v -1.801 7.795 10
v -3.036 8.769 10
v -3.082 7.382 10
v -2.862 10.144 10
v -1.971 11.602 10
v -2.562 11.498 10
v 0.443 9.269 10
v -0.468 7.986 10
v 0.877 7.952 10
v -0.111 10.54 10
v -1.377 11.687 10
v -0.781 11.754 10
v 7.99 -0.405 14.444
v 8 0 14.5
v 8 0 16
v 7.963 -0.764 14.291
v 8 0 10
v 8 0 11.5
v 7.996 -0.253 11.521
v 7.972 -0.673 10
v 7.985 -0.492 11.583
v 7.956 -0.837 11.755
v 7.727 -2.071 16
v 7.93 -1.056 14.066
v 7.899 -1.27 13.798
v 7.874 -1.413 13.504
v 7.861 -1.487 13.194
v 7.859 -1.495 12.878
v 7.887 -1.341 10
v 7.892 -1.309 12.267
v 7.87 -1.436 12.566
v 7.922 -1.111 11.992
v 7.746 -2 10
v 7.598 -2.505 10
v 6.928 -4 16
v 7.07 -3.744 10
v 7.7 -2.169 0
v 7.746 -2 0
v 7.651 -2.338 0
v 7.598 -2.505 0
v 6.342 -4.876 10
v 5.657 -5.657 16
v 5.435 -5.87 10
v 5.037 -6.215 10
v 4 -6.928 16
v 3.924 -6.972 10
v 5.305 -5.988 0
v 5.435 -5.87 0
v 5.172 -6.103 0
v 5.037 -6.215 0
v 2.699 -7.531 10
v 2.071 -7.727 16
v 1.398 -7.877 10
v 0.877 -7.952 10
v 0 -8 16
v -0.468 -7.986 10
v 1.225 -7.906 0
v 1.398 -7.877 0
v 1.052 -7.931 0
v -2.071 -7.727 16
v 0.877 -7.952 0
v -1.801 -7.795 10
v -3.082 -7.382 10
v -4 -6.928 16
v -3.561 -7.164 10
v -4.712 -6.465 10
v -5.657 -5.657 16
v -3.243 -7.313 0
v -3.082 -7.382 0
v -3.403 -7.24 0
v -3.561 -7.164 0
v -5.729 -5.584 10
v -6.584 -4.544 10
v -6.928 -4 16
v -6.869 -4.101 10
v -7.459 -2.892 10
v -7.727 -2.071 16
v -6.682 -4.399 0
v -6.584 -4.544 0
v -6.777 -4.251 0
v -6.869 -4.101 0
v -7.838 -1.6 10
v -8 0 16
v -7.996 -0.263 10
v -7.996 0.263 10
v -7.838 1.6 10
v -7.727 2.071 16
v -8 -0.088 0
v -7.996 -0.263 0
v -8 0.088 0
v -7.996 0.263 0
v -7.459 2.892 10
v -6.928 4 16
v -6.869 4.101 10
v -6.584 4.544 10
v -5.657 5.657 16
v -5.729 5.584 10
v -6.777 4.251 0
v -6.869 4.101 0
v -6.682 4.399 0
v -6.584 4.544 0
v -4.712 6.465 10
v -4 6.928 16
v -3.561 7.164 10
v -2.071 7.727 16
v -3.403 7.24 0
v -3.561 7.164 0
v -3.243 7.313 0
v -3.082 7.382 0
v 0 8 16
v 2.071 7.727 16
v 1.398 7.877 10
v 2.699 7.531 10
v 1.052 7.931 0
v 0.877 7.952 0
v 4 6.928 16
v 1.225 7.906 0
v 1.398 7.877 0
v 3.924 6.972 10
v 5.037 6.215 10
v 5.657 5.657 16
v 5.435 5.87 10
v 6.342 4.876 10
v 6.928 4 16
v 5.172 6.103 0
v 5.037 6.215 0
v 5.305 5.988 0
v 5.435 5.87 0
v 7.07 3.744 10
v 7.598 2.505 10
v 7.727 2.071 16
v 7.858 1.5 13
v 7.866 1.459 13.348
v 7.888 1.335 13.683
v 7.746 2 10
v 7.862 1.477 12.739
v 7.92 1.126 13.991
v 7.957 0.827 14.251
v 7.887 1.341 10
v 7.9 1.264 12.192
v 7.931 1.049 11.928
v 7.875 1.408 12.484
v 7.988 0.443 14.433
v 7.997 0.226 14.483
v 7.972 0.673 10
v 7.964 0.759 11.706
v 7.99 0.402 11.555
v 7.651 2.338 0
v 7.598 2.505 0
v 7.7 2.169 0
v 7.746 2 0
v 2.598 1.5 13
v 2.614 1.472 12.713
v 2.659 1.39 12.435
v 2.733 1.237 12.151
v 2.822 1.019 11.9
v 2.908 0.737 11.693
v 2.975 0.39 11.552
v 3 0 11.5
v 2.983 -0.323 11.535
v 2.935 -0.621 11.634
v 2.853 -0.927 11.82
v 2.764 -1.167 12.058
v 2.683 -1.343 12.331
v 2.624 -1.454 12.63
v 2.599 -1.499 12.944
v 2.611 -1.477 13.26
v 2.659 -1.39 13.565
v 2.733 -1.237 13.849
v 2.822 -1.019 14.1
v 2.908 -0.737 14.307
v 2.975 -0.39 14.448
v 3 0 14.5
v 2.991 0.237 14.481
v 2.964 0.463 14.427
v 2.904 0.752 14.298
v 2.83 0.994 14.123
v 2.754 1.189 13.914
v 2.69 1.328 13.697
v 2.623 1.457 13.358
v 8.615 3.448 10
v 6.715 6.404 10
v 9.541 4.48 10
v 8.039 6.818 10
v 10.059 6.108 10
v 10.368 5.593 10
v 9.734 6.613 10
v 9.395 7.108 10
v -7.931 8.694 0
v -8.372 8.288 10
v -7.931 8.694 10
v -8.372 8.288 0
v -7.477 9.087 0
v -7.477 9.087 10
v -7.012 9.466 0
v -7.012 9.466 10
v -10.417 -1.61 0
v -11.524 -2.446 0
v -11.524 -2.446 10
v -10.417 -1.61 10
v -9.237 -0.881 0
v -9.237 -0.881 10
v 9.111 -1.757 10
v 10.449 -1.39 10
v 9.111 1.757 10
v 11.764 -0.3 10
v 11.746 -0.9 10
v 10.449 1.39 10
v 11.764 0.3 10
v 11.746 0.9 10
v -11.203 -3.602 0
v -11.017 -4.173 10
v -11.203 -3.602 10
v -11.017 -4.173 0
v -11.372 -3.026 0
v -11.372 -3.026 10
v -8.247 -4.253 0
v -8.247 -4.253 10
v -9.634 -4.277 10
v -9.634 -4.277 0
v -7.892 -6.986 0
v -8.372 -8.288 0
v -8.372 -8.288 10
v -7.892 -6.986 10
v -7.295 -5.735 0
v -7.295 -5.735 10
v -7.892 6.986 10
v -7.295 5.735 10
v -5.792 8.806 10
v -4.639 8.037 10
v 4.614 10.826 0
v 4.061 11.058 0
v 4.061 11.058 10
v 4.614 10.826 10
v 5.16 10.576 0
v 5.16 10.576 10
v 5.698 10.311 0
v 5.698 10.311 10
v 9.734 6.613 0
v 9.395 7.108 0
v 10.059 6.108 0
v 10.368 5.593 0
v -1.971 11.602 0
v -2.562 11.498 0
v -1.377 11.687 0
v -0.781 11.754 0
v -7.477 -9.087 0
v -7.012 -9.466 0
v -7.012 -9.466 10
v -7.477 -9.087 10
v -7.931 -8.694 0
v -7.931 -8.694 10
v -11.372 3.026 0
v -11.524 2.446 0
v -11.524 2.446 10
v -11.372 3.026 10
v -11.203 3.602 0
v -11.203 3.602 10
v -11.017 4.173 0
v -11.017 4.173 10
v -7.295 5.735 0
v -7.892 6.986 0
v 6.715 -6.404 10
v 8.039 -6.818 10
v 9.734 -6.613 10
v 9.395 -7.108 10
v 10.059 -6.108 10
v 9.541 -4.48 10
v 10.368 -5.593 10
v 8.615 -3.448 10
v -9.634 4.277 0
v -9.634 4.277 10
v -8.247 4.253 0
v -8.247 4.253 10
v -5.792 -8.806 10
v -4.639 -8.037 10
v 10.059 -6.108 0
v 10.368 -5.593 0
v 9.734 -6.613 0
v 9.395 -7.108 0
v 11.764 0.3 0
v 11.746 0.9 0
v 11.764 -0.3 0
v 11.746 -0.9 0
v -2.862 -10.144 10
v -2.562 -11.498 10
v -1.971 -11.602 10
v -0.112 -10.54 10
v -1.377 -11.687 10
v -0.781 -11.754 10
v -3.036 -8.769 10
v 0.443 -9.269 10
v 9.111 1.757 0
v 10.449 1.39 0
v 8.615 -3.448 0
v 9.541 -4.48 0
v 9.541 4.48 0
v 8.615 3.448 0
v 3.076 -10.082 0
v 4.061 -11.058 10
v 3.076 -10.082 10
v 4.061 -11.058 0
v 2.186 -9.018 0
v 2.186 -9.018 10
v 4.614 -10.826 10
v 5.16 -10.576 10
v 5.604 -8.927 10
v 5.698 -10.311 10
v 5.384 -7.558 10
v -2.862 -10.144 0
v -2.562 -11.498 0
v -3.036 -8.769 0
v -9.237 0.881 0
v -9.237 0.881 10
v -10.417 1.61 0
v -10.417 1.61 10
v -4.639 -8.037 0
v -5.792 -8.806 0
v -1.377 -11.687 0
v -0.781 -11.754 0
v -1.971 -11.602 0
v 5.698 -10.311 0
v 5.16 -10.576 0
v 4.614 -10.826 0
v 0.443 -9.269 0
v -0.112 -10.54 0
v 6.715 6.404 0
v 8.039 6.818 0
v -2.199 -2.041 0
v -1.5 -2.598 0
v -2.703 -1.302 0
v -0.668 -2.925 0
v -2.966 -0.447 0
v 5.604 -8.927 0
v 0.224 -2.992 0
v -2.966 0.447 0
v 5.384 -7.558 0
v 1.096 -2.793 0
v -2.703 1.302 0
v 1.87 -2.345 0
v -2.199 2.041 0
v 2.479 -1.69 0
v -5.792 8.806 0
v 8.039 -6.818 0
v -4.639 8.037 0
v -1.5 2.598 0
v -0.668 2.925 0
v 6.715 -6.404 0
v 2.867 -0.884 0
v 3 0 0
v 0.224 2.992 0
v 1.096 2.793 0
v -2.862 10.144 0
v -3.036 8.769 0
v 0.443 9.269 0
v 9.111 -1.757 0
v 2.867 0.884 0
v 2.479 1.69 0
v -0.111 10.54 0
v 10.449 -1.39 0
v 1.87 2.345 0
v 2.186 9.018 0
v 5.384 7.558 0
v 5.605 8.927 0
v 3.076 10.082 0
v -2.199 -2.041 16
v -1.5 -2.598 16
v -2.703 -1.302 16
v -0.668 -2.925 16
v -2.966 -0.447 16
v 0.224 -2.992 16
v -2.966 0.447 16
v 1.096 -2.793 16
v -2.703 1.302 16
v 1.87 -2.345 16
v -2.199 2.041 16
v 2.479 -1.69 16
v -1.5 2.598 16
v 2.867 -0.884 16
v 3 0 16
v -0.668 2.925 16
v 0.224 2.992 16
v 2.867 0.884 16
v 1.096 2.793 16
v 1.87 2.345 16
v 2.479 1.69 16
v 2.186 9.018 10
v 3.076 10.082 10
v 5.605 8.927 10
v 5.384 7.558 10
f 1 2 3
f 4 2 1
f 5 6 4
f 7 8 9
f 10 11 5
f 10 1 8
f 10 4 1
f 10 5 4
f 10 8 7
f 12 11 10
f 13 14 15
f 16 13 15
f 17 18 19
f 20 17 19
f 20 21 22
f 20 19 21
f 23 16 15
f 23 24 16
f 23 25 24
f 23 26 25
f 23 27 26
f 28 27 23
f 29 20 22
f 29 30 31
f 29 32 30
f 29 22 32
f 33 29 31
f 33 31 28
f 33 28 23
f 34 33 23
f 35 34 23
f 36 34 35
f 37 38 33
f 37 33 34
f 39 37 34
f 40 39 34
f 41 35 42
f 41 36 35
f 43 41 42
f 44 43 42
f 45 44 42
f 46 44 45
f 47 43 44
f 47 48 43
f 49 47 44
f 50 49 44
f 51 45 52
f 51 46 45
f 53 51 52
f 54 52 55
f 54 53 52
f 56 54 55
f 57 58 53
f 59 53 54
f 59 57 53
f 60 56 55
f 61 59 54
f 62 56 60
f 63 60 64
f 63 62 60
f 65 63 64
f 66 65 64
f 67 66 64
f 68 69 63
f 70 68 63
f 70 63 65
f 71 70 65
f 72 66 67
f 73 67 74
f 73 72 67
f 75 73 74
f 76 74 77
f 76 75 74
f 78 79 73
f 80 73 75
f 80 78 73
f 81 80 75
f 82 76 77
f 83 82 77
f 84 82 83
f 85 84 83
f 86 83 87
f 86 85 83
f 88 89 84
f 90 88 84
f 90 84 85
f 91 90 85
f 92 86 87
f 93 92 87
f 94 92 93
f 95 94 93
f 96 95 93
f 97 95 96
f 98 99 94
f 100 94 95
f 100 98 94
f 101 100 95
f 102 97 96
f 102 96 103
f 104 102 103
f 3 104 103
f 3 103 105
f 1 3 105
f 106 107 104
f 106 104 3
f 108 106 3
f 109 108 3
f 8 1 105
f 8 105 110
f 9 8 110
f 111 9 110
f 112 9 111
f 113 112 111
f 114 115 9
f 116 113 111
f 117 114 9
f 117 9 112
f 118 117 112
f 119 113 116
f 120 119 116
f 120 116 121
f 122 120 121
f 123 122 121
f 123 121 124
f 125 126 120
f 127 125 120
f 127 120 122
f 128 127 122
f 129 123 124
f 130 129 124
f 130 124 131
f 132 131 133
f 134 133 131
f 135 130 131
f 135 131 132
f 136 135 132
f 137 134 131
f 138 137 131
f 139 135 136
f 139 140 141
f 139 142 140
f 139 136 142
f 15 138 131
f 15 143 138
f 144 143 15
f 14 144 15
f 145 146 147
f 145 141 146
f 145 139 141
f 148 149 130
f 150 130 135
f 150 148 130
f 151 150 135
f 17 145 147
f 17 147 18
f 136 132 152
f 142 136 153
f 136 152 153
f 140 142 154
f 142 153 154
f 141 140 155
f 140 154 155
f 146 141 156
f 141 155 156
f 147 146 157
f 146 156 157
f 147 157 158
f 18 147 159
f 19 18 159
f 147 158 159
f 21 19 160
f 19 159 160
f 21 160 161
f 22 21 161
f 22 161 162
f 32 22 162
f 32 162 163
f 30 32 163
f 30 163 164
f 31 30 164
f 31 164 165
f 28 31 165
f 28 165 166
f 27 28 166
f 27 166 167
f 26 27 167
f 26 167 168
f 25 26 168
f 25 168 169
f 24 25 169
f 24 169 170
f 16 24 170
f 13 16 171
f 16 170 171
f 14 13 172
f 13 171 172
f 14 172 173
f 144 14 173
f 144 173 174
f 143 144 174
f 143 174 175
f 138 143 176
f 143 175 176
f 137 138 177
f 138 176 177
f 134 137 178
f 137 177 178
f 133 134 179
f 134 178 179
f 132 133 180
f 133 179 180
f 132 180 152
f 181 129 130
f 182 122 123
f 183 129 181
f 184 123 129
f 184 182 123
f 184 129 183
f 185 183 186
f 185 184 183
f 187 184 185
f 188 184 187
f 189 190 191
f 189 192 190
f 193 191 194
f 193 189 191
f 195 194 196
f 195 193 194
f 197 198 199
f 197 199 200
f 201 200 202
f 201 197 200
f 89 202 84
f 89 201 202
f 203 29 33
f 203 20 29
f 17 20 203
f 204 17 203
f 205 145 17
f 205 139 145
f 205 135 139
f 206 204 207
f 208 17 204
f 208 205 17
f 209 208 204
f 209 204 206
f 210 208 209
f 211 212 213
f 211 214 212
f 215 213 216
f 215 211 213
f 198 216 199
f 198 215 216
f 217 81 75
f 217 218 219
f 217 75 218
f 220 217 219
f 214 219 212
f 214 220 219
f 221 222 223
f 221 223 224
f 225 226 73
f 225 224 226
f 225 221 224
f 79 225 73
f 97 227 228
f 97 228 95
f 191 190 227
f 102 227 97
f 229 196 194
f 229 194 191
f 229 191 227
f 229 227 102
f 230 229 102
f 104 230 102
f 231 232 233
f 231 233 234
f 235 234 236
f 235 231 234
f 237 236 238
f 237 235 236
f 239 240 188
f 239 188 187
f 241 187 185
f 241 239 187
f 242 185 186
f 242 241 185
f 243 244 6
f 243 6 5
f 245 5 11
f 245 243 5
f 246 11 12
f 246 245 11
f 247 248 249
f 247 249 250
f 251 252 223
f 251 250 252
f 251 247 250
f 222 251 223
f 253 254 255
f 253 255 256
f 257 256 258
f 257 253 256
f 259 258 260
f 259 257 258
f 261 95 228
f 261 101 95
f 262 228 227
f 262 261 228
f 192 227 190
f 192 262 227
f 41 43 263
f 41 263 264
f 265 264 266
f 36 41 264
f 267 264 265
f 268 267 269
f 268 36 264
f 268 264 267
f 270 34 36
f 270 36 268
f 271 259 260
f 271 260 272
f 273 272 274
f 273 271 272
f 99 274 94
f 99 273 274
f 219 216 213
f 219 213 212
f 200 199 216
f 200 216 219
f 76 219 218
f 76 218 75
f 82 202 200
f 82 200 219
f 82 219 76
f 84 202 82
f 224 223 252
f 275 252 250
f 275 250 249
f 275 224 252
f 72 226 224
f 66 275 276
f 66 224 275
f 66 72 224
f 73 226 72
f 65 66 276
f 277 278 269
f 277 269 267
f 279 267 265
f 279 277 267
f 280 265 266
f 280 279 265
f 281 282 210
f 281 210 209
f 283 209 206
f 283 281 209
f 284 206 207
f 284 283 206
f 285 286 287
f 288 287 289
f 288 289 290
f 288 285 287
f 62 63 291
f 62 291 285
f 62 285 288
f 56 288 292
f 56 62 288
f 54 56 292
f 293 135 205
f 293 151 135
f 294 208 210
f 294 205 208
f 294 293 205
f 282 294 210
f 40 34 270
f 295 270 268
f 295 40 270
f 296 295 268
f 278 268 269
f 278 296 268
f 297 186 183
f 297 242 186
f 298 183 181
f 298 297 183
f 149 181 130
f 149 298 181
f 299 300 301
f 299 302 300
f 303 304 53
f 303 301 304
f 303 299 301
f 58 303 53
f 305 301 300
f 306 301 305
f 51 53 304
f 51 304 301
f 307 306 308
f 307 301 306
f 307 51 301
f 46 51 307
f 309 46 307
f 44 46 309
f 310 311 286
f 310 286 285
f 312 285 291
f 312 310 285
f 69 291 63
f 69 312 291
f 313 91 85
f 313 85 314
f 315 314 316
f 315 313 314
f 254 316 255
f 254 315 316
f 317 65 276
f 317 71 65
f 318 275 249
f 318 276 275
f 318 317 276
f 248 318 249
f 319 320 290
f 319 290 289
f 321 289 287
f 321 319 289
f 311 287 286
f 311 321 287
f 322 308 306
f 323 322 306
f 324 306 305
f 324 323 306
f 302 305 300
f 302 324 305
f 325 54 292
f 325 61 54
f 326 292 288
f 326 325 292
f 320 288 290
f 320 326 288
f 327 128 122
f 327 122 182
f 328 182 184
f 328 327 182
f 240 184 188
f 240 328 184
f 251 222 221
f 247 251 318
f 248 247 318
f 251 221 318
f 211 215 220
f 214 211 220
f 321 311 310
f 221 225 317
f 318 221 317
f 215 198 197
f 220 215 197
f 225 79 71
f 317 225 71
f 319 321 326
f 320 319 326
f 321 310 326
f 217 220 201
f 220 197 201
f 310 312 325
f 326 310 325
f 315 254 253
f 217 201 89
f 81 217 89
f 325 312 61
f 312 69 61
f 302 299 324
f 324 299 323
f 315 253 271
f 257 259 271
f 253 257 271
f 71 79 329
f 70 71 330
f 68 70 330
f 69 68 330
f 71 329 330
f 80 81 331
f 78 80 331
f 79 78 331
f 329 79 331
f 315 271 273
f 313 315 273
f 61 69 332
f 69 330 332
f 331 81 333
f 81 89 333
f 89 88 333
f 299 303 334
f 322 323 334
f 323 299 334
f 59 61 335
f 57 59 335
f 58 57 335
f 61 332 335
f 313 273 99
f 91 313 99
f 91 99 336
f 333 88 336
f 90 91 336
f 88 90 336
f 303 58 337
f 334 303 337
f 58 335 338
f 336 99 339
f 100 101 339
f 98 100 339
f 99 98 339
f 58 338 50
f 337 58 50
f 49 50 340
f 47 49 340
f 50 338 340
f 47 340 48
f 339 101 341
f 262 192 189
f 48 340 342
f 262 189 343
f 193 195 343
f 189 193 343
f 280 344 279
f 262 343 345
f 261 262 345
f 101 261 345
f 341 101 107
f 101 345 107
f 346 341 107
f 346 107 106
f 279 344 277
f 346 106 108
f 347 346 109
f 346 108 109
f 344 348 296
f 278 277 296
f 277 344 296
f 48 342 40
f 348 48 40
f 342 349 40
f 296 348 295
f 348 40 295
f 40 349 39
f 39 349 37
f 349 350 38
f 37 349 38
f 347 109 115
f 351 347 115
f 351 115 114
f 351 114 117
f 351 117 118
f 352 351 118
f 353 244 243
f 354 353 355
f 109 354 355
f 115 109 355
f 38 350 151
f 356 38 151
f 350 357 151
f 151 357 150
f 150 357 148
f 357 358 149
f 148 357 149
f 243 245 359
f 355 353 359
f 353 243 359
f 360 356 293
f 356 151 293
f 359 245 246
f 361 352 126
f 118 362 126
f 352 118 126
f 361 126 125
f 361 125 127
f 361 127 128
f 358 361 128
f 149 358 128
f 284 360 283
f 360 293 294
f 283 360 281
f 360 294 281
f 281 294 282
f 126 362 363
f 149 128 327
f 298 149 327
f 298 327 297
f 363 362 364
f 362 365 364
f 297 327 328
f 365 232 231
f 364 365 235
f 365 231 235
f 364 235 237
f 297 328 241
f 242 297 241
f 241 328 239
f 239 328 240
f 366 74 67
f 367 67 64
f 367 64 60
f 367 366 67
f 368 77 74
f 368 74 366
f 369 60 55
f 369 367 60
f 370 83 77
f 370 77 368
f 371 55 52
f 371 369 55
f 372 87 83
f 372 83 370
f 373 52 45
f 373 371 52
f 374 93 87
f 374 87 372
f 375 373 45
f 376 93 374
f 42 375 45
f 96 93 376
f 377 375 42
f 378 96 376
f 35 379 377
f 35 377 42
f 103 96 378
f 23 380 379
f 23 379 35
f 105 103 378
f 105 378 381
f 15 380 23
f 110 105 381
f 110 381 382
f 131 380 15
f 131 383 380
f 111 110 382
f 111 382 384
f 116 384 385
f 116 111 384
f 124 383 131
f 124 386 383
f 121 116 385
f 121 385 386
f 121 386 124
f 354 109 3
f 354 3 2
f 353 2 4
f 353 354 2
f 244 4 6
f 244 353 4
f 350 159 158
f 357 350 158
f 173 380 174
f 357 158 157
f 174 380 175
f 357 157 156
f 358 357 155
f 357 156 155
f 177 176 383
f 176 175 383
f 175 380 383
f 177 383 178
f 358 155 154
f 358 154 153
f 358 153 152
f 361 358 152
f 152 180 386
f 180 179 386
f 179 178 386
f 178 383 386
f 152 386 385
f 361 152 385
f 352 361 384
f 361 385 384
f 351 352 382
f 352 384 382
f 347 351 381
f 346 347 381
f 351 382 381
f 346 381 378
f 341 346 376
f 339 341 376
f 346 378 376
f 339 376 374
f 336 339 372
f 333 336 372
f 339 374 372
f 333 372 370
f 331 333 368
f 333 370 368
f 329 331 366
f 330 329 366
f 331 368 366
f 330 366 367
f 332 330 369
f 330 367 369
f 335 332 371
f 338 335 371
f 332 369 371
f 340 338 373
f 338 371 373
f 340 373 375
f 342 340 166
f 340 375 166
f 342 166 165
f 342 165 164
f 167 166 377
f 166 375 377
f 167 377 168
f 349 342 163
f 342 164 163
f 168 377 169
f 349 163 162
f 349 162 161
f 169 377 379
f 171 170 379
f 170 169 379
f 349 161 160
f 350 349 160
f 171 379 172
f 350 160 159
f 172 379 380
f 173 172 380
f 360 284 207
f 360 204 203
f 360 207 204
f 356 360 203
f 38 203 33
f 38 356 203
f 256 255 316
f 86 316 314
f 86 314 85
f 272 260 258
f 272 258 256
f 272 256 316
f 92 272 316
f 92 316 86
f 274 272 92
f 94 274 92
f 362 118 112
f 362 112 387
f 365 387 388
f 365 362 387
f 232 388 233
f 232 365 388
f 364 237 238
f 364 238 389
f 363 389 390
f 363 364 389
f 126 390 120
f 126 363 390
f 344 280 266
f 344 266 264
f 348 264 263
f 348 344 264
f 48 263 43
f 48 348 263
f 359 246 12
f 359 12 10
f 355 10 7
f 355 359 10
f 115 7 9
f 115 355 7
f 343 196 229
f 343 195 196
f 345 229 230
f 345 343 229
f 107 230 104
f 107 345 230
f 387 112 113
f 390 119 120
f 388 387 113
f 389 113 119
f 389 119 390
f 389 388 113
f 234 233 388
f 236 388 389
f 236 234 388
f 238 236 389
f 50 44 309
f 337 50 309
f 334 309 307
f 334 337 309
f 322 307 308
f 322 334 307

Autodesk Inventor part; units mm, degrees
ref_plane "YZ Plane" through (0, 0, 0) normal (1, 0, 0) x (0, 1, 0)
ref_plane "XZ Plane" through (0, 0, 0) normal (0, 1, 0) x (-1, 0, 0)
ref_plane "XY Plane" through (0, 0, 0) normal (0, 0, 1) x (1, 0, 0)
sketch "Sketch1" plane through (0, 0, 0) normal (0, 0, 1) x (1, 0, 0)
  circle A0 centre (0, 0) radius 8
  line L0 (0, 0) -> (16, 0) construction
  arc A1 (11.746, 0.9) -> (7.746, 2) centre (5.8068, -12.8741) ccw
  arc A2 (7.746, -2) -> (11.746, -0.9) centre (5.8068, 12.8741) ccw
  arc A3 (7.746, -2) -> (7.746, 2) centre (0, 0) ccw
  arc A4 (11.746, -0.9) -> (11.746, 0.9) centre (-8.2338, 0) ccw
  arc A5 (9.3948, 7.1075) -> (5.435, 5.8703) centre (11.8453, -7.691) ccw
  arc A6 (10.3679, 5.5932) -> (9.3948, 7.1075) centre (-6.9267, -4.4515) ccw
  arc A7 (7.5976, 2.5053) -> (10.3679, 5.5932) centre (-2.0753, 13.9698) ccw
  arc A8 (7.5976, 2.5053) -> (5.435, 5.8703) centre (0, 0) ccw
  arc A9 (4.0608, 11.0584) -> (1.3985, 7.8768) centre (14.123, -0.066) ccw
  arc A10 (5.6981, 10.3106) -> (4.0608, 11.0584) centre (-3.4204, -7.4897) ccw
  arc A11 (5.0371, 6.2151) -> (5.6981, 10.3106) centre (-9.2985, 10.6302) ccw
  arc A12 (5.0371, 6.2151) -> (1.3985, 7.8768) centre (0, 0) ccw
  arc A13 (-2.5625, 11.4983) -> (-3.082, 7.3825) centre (11.9167, 7.5799) ccw
  arc A14 (-0.7808, 11.7545) -> (-2.5625, 11.4983) centre (1.1718, -8.15) ccw
  arc A15 (0.8773, 7.9518) -> (-0.7808, 11.7545) centre (-13.5695, 3.9155) ccw
  arc A16 (0.8773, 7.9518) -> (-3.082, 7.3825) centre (0, 0) ccw
  arc A17 (-8.3721, 8.2876) -> (-6.584, 4.5443) centre (5.927, 12.8193) ccw
  arc A18 (-7.0118, 9.4664) -> (-8.3721, 8.2876) centre (5.392, -6.2227) ccw
  arc A19 (-3.561, 7.1637) -> (-7.0118, 9.4664) centre (-13.5323, -4.0423) ccw
  arc A20 (-3.561, 7.1637) -> (-6.584, 4.5443) centre (0, 0) ccw
  arc A21 (-11.5237, 2.4457) -> (-7.9957, 0.2633) centre (-1.9446, 13.9886) ccw
  arc A22 (-11.0166, 4.1728) -> (-11.5237, 2.4457) centre (7.9002, -2.3197) ccw
  arc A23 (-6.8687, 4.1013) -> (-11.0166, 4.1728) centre (-9.1987, -10.7167) ccw
  arc A24 (-6.8687, 4.1013) -> (-7.9957, 0.2633) centre (0, 0) ccw
  arc A25 (-11.0166, -4.1728) -> (-6.8687, -4.1013) centre (-9.1987, 10.7167) ccw
  arc A26 (-11.5237, -2.4457) -> (-11.0166, -4.1728) centre (7.9002, 2.3197) ccw
  arc A27 (-7.9957, -0.2633) -> (-11.5237, -2.4457) centre (-1.9446, -13.9886) ccw
  arc A28 (-7.9957, -0.2633) -> (-6.8687, -4.1013) centre (0, 0) ccw
  arc A29 (-7.0118, -9.4664) -> (-3.561, -7.1637) centre (-13.5323, 4.0423) ccw
  arc A30 (-8.3721, -8.2876) -> (-7.0118, -9.4664) centre (5.392, 6.2227) ccw
  arc A31 (-6.584, -4.5443) -> (-8.3721, -8.2876) centre (5.927, -12.8193) ccw
  arc A32 (-6.584, -4.5443) -> (-3.561, -7.1637) centre (0, 0) ccw
  arc A33 (-0.7808, -11.7545) -> (0.8773, -7.9518) centre (-13.5695, -3.9155) ccw
  arc A34 (-2.5625, -11.4983) -> (-0.7808, -11.7545) centre (1.1718, 8.15) ccw
  arc A35 (-3.082, -7.3825) -> (-2.5625, -11.4983) centre (11.9167, -7.5799) ccw
  arc A36 (-3.082, -7.3825) -> (0.8773, -7.9518) centre (0, 0) ccw
  arc A37 (5.6981, -10.3106) -> (5.0371, -6.2151) centre (-9.2985, -10.6302) ccw
  arc A38 (4.0608, -11.0584) -> (5.6981, -10.3106) centre (-3.4204, 7.4897) ccw
  arc A39 (1.3985, -7.8768) -> (4.0608, -11.0584) centre (14.123, 0.066) ccw
  arc A40 (1.3985, -7.8768) -> (5.0371, -6.2151) centre (0, 0) ccw
  arc A41 (10.3679, -5.5932) -> (7.5976, -2.5053) centre (-2.0753, -13.9698) ccw
  arc A42 (9.3948, -7.1075) -> (10.3679, -5.5932) centre (-6.9267, 4.4515) ccw
  arc A43 (5.435, -5.8703) -> (9.3948, -7.1075) centre (11.8453, 7.691) ccw
  arc A44 (5.435, -5.8703) -> (7.5976, -2.5053) centre (0, 0) ccw
  point P0 (11.7662, 0)
  point P1 (9.8984, 6.3613)
  point P2 (4.8879, 10.7029)
  point P3 (-1.6745, 11.6465)
  point P4 (-7.7052, 8.8923)
  point P5 (-11.2896, 3.3149)
  point P6 (-11.2896, -3.3149)
  point P7 (-7.7052, -8.8923)
  point P8 (-1.6745, -11.6465)
  point P9 (4.8879, -10.7029)
  point P10 (9.8984, -6.3613)
  dimension "d0" = 16
  dimension "d1" = 16
  dimension "d2" = 15
  dimension "d3" = 4
  dimension "d4" = 2
  dimension "d6" = 1.8
  dimension "d15" = 20
  dimension "d18" = 360
extrude "Extrusion1" add sketch "Sketch1" along normal blind 10
sketch "Sketch2" plane through (0, 0, 10) normal (0, 0, 1) x (1, 0, 0)
  circle A0 centre (0, 0) radius 3
  circle A1 centre (0, 0) radius 8
  dimension "d22" = 6
  dimension "d23" = 16
extrude "Extrusion2" add sketch "Sketch2" along normal blind 6
sketch "Sketch3" plane through (0, 0, 16) normal (0, 0, 1) x (1, 0, 0)
  circle A0 centre (0, 0) radius 3 projected
extrude "Extrusion3" cut sketch "Sketch3" against normal through all
sketch "Sketch4" plane through (0, 0, 0) normal (1, 0, 0) x (0, 1, 0)
  circle A0 centre (0, 13) radius 1.5
  line L0 (8, 16) -> (-8, 16) projected
  point P0 (0, 0)
  dimension "d28" = 3
  dimension "d29" = 3
extrude "Extrusion4" cut sketch "Sketch4" along normal through all
properties part number "Motor Gear" material "ABS Plastic"
